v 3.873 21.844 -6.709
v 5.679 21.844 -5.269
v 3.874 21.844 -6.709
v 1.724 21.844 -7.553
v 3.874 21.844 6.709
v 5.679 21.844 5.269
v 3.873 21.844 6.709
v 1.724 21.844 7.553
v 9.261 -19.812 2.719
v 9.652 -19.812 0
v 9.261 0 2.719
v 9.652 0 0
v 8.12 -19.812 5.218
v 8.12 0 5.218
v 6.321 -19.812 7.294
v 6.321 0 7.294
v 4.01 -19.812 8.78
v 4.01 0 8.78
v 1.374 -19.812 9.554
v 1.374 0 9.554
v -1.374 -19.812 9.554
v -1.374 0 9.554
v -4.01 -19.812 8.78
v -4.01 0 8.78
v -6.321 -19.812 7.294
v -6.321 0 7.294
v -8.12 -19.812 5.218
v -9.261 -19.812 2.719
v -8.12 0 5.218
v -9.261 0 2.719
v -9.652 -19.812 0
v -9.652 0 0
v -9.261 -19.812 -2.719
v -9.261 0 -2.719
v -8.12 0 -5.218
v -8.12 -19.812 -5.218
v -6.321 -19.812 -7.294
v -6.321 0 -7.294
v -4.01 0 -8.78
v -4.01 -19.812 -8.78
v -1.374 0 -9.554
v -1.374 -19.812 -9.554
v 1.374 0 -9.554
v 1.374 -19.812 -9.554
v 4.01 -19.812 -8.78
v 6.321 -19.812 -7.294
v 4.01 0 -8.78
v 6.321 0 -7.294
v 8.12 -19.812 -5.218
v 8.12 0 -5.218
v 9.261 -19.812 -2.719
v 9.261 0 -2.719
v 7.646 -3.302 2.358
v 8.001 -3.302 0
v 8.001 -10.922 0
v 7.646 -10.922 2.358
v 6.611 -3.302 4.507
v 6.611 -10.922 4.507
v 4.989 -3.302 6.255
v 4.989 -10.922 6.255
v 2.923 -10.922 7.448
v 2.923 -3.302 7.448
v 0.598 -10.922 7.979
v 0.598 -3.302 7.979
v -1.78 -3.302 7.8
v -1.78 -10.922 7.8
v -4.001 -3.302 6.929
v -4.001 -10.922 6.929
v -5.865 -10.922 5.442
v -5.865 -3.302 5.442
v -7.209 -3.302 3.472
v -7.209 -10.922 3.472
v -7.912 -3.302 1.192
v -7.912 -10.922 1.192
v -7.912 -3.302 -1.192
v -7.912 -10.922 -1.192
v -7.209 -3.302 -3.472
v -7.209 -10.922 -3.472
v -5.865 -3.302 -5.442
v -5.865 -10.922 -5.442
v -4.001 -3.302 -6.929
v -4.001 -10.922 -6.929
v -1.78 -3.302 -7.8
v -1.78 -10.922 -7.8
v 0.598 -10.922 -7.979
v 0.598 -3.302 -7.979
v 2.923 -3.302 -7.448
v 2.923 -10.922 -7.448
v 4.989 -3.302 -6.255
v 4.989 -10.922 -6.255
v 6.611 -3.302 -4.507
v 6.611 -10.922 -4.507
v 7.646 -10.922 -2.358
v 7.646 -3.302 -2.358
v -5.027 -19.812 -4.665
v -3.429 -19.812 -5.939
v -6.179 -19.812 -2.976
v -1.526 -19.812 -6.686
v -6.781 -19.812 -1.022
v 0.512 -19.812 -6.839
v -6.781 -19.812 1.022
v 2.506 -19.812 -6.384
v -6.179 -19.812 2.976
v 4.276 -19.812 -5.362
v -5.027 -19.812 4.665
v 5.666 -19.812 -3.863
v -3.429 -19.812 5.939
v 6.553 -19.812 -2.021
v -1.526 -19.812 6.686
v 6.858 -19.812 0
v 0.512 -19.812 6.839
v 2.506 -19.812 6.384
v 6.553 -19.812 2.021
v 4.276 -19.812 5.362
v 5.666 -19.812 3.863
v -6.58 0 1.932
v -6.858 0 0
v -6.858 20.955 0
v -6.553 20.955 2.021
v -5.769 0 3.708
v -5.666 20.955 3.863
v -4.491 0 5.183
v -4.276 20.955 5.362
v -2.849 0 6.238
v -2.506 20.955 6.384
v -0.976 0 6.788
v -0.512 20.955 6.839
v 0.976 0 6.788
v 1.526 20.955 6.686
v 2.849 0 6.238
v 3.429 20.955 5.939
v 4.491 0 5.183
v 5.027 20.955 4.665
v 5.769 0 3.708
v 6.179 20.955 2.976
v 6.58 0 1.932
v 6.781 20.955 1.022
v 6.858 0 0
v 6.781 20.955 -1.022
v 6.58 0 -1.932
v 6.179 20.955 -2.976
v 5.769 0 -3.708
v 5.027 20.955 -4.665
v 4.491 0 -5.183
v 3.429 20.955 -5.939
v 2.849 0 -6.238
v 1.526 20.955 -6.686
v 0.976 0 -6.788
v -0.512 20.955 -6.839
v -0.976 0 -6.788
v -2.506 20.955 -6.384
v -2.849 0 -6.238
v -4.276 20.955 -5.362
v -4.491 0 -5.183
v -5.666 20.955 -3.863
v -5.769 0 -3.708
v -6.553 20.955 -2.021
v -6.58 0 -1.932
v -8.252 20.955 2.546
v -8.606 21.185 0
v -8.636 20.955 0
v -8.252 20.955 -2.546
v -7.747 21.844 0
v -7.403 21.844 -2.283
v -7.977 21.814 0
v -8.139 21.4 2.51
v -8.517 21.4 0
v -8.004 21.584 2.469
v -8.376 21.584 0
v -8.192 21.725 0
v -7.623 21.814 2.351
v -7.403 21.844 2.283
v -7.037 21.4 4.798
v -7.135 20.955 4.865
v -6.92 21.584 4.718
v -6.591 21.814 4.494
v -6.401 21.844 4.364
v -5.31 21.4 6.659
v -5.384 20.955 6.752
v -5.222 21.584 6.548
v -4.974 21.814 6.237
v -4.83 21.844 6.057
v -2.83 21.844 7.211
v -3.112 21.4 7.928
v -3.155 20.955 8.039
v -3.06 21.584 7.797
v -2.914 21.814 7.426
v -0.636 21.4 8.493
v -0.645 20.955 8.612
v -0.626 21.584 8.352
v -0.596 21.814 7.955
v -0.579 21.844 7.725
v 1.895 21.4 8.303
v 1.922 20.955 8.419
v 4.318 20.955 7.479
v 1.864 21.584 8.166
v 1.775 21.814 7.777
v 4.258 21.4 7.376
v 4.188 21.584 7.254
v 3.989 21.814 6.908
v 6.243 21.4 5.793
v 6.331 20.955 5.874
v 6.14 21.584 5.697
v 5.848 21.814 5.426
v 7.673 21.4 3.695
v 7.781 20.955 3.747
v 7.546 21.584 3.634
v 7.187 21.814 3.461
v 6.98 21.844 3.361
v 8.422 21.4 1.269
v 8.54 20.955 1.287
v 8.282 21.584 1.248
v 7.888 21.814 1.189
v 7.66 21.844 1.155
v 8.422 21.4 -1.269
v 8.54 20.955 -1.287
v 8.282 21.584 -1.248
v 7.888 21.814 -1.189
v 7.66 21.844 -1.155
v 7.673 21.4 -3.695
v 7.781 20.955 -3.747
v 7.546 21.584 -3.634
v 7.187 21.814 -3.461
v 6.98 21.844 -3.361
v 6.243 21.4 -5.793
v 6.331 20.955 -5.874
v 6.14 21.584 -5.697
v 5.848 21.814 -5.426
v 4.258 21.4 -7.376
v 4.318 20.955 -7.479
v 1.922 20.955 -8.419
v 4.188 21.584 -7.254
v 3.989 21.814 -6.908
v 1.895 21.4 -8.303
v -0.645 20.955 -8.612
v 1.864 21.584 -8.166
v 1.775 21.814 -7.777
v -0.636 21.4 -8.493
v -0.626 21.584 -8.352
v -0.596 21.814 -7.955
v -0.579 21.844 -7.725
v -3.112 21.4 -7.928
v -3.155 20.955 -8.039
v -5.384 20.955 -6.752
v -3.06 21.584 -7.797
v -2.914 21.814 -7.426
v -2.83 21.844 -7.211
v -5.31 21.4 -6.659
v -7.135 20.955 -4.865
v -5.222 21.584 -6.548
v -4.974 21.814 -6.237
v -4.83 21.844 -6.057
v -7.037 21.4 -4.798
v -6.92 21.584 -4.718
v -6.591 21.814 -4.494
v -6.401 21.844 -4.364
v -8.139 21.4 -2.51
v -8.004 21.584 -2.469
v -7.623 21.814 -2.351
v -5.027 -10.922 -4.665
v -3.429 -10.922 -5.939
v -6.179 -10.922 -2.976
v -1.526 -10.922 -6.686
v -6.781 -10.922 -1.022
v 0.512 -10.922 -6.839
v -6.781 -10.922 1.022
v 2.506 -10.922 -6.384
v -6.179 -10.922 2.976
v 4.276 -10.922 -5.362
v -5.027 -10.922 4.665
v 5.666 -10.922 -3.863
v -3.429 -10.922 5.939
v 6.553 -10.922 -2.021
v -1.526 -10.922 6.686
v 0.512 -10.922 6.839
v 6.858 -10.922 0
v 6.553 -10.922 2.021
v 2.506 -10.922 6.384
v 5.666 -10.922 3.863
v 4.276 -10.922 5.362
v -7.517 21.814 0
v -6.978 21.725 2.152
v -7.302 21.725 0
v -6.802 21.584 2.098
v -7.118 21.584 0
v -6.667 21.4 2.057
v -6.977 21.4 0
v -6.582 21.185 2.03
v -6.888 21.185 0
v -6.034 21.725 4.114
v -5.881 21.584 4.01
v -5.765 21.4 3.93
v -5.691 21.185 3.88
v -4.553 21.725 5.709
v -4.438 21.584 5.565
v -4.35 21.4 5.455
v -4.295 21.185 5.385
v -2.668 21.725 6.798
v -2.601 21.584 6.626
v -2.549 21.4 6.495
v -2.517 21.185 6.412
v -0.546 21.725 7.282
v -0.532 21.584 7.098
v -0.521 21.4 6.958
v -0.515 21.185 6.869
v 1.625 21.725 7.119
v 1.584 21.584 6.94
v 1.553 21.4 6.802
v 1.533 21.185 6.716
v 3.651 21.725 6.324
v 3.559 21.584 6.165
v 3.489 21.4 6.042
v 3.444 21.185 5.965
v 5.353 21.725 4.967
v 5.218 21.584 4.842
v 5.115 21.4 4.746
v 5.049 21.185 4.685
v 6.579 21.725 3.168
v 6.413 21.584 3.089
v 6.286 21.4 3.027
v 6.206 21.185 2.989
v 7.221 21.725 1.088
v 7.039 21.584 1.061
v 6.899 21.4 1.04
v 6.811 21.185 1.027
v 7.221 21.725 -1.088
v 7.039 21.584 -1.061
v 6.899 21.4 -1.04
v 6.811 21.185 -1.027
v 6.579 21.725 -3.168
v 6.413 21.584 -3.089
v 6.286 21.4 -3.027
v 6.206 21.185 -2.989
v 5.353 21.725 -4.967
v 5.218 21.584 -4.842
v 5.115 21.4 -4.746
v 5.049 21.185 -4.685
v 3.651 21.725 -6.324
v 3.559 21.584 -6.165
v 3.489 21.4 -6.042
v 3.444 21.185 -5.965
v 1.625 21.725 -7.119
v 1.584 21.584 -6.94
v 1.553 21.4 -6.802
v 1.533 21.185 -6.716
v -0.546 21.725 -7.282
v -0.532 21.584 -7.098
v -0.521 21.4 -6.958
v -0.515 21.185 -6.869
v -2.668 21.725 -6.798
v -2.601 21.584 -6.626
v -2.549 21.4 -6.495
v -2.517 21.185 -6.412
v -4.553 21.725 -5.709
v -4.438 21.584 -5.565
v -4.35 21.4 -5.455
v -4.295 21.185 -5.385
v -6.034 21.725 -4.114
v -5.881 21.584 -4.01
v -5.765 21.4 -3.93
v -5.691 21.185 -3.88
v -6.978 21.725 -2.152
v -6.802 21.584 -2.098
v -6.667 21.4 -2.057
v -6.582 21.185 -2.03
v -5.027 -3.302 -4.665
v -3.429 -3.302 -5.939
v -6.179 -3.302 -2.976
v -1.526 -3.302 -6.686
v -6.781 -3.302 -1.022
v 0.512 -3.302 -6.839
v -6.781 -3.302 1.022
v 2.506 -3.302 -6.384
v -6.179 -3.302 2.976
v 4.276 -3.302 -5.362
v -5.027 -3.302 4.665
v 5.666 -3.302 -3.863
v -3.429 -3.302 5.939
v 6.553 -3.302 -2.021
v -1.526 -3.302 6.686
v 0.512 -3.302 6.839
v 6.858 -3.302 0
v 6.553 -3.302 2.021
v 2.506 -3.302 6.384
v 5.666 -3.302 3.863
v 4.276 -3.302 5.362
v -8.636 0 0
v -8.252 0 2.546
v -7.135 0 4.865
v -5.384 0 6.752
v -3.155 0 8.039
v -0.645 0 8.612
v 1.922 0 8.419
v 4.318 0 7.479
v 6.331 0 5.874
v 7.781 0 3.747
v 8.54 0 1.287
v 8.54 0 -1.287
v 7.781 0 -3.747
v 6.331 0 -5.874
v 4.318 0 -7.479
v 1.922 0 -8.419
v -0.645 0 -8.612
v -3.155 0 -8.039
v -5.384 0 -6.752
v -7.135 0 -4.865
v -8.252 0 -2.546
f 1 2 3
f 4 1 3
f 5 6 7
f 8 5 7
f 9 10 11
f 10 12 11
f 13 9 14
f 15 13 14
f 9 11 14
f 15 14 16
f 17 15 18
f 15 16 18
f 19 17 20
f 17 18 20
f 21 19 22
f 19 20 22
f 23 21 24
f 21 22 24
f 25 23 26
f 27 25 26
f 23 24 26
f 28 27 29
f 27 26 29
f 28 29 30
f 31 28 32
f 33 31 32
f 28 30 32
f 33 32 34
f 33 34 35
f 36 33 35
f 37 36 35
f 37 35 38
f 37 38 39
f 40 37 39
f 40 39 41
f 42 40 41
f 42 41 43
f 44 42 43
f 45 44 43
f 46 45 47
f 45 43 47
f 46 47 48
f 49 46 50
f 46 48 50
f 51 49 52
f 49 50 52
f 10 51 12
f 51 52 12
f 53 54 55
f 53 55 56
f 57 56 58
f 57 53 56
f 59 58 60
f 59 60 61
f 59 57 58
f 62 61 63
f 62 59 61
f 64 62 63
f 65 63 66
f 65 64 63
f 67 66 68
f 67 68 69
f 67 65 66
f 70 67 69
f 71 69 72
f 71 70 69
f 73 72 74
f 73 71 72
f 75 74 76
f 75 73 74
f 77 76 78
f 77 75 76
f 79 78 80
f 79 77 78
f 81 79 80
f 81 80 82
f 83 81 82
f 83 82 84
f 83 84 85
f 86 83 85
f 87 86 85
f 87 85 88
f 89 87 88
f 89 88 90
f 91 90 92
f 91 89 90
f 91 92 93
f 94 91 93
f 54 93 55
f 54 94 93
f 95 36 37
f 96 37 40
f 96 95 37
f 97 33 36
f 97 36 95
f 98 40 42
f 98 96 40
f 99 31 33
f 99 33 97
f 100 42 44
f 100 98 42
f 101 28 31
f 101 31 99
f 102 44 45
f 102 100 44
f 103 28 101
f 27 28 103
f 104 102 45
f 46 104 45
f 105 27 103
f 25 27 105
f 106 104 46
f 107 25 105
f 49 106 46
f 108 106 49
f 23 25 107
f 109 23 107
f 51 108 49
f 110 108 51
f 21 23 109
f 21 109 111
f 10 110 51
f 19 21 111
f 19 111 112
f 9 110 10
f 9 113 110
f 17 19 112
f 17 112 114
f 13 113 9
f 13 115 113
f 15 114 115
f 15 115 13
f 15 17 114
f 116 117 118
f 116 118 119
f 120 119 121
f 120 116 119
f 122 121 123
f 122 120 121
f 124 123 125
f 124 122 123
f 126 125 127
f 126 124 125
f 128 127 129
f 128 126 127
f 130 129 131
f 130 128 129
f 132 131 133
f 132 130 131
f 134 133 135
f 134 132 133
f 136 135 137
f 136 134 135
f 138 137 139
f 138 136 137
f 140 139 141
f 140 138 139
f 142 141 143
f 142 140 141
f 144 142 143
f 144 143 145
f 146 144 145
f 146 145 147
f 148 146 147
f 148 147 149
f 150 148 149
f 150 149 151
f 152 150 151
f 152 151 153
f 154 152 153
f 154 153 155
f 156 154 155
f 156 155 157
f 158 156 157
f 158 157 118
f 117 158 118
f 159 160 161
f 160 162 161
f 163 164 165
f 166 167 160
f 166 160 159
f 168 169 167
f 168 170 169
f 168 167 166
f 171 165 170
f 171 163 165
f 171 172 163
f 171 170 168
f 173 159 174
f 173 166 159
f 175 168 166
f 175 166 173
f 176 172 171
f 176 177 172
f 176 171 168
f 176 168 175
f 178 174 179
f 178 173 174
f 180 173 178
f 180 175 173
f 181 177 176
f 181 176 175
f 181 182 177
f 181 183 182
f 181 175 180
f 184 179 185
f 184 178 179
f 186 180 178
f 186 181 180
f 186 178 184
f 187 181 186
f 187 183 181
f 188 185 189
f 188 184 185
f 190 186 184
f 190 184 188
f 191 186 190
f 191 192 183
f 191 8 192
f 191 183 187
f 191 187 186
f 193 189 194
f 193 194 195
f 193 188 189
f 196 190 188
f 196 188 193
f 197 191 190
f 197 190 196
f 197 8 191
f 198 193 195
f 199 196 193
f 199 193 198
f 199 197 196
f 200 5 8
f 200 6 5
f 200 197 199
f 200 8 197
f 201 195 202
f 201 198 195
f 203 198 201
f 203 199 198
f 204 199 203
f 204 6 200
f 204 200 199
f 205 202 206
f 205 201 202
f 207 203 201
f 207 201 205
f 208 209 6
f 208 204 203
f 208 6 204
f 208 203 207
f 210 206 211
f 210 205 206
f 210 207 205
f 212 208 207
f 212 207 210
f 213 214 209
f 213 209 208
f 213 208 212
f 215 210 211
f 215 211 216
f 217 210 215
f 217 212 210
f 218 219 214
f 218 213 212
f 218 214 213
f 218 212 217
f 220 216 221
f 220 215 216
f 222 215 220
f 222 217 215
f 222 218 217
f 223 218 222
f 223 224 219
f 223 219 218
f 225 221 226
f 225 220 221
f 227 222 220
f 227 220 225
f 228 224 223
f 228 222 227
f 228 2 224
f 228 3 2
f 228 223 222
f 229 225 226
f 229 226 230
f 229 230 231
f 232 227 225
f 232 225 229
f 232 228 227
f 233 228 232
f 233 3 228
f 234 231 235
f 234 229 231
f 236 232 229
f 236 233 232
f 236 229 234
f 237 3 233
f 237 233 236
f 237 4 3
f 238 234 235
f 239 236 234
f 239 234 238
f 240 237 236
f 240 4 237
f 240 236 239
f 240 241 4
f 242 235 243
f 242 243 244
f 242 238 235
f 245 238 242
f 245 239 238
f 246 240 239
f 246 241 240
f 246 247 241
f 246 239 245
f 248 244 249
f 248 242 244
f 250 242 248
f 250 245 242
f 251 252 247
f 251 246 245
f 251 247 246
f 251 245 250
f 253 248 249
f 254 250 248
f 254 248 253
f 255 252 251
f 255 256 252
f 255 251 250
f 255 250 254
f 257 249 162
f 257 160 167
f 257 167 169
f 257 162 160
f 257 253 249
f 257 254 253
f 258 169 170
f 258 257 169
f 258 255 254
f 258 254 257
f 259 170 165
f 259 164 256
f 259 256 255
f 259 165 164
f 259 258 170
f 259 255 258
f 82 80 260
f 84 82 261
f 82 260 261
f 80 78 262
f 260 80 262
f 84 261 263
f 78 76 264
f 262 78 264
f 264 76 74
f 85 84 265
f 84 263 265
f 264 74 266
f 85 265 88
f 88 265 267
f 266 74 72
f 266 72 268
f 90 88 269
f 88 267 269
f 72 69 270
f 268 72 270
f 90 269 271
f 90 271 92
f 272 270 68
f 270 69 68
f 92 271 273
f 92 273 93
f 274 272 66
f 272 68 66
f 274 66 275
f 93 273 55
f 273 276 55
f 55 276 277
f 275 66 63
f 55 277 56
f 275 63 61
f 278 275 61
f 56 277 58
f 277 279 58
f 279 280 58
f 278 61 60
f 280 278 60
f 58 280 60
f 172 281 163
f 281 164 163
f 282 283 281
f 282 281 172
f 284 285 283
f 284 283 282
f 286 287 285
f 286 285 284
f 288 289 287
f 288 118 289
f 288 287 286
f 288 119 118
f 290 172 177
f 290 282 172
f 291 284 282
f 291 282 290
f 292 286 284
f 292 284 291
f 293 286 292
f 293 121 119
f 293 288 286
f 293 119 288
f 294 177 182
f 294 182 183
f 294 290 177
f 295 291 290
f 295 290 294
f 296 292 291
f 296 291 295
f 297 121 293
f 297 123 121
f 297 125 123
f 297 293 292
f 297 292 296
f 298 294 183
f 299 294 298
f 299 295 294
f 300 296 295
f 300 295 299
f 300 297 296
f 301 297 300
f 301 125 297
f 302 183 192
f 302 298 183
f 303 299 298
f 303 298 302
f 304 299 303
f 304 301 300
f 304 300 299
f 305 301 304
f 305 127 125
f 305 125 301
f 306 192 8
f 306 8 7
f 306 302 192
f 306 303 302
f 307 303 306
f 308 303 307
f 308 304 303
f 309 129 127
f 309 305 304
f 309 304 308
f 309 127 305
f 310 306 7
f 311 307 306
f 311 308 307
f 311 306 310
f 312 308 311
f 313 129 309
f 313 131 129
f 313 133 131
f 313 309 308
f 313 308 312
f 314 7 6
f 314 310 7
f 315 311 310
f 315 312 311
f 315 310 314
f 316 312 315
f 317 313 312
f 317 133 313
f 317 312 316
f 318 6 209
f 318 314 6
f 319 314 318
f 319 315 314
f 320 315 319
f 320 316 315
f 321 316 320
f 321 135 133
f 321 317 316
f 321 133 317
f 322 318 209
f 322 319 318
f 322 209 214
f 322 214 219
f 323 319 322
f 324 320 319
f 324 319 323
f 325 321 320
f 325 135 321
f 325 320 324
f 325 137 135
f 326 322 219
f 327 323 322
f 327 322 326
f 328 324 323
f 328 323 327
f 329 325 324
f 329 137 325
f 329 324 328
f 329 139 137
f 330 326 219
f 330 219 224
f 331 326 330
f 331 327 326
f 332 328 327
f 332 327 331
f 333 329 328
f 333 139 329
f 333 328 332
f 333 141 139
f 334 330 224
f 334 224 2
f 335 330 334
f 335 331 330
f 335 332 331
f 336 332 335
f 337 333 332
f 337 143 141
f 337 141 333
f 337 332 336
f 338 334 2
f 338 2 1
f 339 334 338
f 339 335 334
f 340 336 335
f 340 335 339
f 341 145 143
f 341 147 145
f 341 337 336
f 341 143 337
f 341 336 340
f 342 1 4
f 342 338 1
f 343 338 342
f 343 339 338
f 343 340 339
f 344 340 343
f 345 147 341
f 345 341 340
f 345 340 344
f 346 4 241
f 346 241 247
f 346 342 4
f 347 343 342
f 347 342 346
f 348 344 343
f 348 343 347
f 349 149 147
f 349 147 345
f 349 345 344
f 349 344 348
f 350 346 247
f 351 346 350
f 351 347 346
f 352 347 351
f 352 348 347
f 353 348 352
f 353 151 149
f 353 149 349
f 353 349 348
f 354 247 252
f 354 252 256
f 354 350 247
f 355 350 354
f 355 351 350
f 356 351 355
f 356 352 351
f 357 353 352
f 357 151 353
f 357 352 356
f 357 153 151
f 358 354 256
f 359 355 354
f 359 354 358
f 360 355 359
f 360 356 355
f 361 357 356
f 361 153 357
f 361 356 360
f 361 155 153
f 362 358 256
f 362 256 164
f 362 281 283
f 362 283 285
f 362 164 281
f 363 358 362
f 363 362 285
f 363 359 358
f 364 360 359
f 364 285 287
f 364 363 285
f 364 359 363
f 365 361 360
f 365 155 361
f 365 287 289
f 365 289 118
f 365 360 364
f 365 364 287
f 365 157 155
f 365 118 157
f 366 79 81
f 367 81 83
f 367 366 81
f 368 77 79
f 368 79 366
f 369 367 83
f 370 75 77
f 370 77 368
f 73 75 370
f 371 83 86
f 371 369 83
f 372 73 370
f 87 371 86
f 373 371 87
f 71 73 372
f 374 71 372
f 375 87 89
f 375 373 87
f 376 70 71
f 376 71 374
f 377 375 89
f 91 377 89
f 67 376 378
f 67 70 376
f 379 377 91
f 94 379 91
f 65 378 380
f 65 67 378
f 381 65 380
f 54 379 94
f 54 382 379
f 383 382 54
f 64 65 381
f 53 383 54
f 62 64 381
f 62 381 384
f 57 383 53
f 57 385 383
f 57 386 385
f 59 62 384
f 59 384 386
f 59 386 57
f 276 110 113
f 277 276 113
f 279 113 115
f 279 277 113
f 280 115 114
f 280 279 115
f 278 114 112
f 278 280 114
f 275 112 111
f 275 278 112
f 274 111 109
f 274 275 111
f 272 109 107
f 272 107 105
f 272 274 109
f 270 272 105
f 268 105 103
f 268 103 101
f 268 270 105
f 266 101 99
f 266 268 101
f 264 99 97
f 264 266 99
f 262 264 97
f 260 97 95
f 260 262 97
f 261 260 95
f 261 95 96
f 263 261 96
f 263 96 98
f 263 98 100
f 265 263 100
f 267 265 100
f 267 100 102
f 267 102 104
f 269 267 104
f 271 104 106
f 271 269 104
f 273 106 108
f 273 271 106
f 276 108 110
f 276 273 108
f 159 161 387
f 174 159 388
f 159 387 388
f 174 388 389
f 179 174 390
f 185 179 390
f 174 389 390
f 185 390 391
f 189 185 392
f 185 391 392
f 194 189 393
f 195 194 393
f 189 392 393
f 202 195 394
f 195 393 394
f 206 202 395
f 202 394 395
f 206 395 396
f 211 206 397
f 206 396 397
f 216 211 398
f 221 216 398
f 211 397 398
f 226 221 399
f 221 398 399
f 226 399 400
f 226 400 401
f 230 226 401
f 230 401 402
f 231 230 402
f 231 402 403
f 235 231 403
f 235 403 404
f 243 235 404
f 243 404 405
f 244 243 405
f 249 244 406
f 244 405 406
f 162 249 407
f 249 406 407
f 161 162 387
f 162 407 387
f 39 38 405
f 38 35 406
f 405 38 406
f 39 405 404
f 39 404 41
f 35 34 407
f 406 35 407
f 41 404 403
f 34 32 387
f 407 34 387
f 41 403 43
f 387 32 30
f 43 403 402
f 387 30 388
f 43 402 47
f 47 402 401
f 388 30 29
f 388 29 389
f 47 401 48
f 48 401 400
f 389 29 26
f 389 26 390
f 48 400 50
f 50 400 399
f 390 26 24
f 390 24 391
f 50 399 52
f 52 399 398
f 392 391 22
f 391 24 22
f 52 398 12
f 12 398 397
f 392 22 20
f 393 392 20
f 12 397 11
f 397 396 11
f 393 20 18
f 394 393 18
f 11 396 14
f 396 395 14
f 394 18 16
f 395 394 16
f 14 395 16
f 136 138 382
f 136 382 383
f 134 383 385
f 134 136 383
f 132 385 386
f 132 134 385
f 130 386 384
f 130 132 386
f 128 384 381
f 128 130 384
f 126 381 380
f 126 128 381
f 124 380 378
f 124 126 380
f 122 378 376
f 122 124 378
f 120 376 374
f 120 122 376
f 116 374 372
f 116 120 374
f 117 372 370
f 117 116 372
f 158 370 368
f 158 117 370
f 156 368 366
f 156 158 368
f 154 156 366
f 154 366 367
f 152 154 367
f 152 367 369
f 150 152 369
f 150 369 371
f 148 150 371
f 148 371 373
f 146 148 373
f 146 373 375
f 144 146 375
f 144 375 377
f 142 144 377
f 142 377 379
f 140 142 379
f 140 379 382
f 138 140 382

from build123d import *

# Parameters (mm, degrees)
F0_R     = 9.652
F0_R_2   = 6.858
F1_DEPTH = 3.302
F2_R     = 9.652
F2_R_2   = 8.001
F3_DEPTH = 7.62
F4_R     = 9.652
F4_R_2   = 8.001
F4_R_3   = 6.858
F5_DEPTH = 8.89
F6_R     = 8.636
F6_R_2   = 6.858
F7_DEPTH = 21.844
F8_R     = 0.88899


# Not quite as in the source:
# - a fillet or chamfer is up to 0.001 mm smaller than in the source, because OpenCascade refuses the exact size


with BuildPart() as f1:
    # F0 (on Front) → F1 (new body)
    with BuildSketch(Plane.XZ):
        Circle(F0_R)
        Circle(F0_R_2, mode=Mode.SUBTRACT)
    extrude(amount=F1_DEPTH)

    # F2 (on face) → F3 (join)
    with BuildSketch(Plane.XZ.offset(3.302)):
        Circle(F2_R)
        Circle(F2_R_2, mode=Mode.SUBTRACT)
    extrude(amount=F3_DEPTH)

    # F4 (on face) → F5 (join)
    with BuildSketch(Plane.XZ.offset(10.922)):
        Circle(F4_R)
        Circle(F4_R_2, mode=Mode.SUBTRACT)
        Circle(F4_R_2)
        Circle(F4_R_3, mode=Mode.SUBTRACT)
    extrude(amount=F5_DEPTH)

    # F6 (on face) → F7 (join)
    with BuildSketch(Plane(origin=(0, 0, 0), x_dir=(-1, 0, 0), z_dir=(0, 1, 0))):
        Circle(F6_R)
        Circle(F6_R_2, mode=Mode.SUBTRACT)
    extrude(amount=F7_DEPTH)

    # F8 (radius 0.889 in the source; OpenCascade refuses exactly that, so slightly less here)
    f8_edges = [f1.edges().sort_by_distance(p)[0] for p in [
        (6.858, 21.844, 0),
        (8.636, 21.844, 0),
    ]]
    fillet(f8_edges, radius=F8_R)


solid = f1.part
